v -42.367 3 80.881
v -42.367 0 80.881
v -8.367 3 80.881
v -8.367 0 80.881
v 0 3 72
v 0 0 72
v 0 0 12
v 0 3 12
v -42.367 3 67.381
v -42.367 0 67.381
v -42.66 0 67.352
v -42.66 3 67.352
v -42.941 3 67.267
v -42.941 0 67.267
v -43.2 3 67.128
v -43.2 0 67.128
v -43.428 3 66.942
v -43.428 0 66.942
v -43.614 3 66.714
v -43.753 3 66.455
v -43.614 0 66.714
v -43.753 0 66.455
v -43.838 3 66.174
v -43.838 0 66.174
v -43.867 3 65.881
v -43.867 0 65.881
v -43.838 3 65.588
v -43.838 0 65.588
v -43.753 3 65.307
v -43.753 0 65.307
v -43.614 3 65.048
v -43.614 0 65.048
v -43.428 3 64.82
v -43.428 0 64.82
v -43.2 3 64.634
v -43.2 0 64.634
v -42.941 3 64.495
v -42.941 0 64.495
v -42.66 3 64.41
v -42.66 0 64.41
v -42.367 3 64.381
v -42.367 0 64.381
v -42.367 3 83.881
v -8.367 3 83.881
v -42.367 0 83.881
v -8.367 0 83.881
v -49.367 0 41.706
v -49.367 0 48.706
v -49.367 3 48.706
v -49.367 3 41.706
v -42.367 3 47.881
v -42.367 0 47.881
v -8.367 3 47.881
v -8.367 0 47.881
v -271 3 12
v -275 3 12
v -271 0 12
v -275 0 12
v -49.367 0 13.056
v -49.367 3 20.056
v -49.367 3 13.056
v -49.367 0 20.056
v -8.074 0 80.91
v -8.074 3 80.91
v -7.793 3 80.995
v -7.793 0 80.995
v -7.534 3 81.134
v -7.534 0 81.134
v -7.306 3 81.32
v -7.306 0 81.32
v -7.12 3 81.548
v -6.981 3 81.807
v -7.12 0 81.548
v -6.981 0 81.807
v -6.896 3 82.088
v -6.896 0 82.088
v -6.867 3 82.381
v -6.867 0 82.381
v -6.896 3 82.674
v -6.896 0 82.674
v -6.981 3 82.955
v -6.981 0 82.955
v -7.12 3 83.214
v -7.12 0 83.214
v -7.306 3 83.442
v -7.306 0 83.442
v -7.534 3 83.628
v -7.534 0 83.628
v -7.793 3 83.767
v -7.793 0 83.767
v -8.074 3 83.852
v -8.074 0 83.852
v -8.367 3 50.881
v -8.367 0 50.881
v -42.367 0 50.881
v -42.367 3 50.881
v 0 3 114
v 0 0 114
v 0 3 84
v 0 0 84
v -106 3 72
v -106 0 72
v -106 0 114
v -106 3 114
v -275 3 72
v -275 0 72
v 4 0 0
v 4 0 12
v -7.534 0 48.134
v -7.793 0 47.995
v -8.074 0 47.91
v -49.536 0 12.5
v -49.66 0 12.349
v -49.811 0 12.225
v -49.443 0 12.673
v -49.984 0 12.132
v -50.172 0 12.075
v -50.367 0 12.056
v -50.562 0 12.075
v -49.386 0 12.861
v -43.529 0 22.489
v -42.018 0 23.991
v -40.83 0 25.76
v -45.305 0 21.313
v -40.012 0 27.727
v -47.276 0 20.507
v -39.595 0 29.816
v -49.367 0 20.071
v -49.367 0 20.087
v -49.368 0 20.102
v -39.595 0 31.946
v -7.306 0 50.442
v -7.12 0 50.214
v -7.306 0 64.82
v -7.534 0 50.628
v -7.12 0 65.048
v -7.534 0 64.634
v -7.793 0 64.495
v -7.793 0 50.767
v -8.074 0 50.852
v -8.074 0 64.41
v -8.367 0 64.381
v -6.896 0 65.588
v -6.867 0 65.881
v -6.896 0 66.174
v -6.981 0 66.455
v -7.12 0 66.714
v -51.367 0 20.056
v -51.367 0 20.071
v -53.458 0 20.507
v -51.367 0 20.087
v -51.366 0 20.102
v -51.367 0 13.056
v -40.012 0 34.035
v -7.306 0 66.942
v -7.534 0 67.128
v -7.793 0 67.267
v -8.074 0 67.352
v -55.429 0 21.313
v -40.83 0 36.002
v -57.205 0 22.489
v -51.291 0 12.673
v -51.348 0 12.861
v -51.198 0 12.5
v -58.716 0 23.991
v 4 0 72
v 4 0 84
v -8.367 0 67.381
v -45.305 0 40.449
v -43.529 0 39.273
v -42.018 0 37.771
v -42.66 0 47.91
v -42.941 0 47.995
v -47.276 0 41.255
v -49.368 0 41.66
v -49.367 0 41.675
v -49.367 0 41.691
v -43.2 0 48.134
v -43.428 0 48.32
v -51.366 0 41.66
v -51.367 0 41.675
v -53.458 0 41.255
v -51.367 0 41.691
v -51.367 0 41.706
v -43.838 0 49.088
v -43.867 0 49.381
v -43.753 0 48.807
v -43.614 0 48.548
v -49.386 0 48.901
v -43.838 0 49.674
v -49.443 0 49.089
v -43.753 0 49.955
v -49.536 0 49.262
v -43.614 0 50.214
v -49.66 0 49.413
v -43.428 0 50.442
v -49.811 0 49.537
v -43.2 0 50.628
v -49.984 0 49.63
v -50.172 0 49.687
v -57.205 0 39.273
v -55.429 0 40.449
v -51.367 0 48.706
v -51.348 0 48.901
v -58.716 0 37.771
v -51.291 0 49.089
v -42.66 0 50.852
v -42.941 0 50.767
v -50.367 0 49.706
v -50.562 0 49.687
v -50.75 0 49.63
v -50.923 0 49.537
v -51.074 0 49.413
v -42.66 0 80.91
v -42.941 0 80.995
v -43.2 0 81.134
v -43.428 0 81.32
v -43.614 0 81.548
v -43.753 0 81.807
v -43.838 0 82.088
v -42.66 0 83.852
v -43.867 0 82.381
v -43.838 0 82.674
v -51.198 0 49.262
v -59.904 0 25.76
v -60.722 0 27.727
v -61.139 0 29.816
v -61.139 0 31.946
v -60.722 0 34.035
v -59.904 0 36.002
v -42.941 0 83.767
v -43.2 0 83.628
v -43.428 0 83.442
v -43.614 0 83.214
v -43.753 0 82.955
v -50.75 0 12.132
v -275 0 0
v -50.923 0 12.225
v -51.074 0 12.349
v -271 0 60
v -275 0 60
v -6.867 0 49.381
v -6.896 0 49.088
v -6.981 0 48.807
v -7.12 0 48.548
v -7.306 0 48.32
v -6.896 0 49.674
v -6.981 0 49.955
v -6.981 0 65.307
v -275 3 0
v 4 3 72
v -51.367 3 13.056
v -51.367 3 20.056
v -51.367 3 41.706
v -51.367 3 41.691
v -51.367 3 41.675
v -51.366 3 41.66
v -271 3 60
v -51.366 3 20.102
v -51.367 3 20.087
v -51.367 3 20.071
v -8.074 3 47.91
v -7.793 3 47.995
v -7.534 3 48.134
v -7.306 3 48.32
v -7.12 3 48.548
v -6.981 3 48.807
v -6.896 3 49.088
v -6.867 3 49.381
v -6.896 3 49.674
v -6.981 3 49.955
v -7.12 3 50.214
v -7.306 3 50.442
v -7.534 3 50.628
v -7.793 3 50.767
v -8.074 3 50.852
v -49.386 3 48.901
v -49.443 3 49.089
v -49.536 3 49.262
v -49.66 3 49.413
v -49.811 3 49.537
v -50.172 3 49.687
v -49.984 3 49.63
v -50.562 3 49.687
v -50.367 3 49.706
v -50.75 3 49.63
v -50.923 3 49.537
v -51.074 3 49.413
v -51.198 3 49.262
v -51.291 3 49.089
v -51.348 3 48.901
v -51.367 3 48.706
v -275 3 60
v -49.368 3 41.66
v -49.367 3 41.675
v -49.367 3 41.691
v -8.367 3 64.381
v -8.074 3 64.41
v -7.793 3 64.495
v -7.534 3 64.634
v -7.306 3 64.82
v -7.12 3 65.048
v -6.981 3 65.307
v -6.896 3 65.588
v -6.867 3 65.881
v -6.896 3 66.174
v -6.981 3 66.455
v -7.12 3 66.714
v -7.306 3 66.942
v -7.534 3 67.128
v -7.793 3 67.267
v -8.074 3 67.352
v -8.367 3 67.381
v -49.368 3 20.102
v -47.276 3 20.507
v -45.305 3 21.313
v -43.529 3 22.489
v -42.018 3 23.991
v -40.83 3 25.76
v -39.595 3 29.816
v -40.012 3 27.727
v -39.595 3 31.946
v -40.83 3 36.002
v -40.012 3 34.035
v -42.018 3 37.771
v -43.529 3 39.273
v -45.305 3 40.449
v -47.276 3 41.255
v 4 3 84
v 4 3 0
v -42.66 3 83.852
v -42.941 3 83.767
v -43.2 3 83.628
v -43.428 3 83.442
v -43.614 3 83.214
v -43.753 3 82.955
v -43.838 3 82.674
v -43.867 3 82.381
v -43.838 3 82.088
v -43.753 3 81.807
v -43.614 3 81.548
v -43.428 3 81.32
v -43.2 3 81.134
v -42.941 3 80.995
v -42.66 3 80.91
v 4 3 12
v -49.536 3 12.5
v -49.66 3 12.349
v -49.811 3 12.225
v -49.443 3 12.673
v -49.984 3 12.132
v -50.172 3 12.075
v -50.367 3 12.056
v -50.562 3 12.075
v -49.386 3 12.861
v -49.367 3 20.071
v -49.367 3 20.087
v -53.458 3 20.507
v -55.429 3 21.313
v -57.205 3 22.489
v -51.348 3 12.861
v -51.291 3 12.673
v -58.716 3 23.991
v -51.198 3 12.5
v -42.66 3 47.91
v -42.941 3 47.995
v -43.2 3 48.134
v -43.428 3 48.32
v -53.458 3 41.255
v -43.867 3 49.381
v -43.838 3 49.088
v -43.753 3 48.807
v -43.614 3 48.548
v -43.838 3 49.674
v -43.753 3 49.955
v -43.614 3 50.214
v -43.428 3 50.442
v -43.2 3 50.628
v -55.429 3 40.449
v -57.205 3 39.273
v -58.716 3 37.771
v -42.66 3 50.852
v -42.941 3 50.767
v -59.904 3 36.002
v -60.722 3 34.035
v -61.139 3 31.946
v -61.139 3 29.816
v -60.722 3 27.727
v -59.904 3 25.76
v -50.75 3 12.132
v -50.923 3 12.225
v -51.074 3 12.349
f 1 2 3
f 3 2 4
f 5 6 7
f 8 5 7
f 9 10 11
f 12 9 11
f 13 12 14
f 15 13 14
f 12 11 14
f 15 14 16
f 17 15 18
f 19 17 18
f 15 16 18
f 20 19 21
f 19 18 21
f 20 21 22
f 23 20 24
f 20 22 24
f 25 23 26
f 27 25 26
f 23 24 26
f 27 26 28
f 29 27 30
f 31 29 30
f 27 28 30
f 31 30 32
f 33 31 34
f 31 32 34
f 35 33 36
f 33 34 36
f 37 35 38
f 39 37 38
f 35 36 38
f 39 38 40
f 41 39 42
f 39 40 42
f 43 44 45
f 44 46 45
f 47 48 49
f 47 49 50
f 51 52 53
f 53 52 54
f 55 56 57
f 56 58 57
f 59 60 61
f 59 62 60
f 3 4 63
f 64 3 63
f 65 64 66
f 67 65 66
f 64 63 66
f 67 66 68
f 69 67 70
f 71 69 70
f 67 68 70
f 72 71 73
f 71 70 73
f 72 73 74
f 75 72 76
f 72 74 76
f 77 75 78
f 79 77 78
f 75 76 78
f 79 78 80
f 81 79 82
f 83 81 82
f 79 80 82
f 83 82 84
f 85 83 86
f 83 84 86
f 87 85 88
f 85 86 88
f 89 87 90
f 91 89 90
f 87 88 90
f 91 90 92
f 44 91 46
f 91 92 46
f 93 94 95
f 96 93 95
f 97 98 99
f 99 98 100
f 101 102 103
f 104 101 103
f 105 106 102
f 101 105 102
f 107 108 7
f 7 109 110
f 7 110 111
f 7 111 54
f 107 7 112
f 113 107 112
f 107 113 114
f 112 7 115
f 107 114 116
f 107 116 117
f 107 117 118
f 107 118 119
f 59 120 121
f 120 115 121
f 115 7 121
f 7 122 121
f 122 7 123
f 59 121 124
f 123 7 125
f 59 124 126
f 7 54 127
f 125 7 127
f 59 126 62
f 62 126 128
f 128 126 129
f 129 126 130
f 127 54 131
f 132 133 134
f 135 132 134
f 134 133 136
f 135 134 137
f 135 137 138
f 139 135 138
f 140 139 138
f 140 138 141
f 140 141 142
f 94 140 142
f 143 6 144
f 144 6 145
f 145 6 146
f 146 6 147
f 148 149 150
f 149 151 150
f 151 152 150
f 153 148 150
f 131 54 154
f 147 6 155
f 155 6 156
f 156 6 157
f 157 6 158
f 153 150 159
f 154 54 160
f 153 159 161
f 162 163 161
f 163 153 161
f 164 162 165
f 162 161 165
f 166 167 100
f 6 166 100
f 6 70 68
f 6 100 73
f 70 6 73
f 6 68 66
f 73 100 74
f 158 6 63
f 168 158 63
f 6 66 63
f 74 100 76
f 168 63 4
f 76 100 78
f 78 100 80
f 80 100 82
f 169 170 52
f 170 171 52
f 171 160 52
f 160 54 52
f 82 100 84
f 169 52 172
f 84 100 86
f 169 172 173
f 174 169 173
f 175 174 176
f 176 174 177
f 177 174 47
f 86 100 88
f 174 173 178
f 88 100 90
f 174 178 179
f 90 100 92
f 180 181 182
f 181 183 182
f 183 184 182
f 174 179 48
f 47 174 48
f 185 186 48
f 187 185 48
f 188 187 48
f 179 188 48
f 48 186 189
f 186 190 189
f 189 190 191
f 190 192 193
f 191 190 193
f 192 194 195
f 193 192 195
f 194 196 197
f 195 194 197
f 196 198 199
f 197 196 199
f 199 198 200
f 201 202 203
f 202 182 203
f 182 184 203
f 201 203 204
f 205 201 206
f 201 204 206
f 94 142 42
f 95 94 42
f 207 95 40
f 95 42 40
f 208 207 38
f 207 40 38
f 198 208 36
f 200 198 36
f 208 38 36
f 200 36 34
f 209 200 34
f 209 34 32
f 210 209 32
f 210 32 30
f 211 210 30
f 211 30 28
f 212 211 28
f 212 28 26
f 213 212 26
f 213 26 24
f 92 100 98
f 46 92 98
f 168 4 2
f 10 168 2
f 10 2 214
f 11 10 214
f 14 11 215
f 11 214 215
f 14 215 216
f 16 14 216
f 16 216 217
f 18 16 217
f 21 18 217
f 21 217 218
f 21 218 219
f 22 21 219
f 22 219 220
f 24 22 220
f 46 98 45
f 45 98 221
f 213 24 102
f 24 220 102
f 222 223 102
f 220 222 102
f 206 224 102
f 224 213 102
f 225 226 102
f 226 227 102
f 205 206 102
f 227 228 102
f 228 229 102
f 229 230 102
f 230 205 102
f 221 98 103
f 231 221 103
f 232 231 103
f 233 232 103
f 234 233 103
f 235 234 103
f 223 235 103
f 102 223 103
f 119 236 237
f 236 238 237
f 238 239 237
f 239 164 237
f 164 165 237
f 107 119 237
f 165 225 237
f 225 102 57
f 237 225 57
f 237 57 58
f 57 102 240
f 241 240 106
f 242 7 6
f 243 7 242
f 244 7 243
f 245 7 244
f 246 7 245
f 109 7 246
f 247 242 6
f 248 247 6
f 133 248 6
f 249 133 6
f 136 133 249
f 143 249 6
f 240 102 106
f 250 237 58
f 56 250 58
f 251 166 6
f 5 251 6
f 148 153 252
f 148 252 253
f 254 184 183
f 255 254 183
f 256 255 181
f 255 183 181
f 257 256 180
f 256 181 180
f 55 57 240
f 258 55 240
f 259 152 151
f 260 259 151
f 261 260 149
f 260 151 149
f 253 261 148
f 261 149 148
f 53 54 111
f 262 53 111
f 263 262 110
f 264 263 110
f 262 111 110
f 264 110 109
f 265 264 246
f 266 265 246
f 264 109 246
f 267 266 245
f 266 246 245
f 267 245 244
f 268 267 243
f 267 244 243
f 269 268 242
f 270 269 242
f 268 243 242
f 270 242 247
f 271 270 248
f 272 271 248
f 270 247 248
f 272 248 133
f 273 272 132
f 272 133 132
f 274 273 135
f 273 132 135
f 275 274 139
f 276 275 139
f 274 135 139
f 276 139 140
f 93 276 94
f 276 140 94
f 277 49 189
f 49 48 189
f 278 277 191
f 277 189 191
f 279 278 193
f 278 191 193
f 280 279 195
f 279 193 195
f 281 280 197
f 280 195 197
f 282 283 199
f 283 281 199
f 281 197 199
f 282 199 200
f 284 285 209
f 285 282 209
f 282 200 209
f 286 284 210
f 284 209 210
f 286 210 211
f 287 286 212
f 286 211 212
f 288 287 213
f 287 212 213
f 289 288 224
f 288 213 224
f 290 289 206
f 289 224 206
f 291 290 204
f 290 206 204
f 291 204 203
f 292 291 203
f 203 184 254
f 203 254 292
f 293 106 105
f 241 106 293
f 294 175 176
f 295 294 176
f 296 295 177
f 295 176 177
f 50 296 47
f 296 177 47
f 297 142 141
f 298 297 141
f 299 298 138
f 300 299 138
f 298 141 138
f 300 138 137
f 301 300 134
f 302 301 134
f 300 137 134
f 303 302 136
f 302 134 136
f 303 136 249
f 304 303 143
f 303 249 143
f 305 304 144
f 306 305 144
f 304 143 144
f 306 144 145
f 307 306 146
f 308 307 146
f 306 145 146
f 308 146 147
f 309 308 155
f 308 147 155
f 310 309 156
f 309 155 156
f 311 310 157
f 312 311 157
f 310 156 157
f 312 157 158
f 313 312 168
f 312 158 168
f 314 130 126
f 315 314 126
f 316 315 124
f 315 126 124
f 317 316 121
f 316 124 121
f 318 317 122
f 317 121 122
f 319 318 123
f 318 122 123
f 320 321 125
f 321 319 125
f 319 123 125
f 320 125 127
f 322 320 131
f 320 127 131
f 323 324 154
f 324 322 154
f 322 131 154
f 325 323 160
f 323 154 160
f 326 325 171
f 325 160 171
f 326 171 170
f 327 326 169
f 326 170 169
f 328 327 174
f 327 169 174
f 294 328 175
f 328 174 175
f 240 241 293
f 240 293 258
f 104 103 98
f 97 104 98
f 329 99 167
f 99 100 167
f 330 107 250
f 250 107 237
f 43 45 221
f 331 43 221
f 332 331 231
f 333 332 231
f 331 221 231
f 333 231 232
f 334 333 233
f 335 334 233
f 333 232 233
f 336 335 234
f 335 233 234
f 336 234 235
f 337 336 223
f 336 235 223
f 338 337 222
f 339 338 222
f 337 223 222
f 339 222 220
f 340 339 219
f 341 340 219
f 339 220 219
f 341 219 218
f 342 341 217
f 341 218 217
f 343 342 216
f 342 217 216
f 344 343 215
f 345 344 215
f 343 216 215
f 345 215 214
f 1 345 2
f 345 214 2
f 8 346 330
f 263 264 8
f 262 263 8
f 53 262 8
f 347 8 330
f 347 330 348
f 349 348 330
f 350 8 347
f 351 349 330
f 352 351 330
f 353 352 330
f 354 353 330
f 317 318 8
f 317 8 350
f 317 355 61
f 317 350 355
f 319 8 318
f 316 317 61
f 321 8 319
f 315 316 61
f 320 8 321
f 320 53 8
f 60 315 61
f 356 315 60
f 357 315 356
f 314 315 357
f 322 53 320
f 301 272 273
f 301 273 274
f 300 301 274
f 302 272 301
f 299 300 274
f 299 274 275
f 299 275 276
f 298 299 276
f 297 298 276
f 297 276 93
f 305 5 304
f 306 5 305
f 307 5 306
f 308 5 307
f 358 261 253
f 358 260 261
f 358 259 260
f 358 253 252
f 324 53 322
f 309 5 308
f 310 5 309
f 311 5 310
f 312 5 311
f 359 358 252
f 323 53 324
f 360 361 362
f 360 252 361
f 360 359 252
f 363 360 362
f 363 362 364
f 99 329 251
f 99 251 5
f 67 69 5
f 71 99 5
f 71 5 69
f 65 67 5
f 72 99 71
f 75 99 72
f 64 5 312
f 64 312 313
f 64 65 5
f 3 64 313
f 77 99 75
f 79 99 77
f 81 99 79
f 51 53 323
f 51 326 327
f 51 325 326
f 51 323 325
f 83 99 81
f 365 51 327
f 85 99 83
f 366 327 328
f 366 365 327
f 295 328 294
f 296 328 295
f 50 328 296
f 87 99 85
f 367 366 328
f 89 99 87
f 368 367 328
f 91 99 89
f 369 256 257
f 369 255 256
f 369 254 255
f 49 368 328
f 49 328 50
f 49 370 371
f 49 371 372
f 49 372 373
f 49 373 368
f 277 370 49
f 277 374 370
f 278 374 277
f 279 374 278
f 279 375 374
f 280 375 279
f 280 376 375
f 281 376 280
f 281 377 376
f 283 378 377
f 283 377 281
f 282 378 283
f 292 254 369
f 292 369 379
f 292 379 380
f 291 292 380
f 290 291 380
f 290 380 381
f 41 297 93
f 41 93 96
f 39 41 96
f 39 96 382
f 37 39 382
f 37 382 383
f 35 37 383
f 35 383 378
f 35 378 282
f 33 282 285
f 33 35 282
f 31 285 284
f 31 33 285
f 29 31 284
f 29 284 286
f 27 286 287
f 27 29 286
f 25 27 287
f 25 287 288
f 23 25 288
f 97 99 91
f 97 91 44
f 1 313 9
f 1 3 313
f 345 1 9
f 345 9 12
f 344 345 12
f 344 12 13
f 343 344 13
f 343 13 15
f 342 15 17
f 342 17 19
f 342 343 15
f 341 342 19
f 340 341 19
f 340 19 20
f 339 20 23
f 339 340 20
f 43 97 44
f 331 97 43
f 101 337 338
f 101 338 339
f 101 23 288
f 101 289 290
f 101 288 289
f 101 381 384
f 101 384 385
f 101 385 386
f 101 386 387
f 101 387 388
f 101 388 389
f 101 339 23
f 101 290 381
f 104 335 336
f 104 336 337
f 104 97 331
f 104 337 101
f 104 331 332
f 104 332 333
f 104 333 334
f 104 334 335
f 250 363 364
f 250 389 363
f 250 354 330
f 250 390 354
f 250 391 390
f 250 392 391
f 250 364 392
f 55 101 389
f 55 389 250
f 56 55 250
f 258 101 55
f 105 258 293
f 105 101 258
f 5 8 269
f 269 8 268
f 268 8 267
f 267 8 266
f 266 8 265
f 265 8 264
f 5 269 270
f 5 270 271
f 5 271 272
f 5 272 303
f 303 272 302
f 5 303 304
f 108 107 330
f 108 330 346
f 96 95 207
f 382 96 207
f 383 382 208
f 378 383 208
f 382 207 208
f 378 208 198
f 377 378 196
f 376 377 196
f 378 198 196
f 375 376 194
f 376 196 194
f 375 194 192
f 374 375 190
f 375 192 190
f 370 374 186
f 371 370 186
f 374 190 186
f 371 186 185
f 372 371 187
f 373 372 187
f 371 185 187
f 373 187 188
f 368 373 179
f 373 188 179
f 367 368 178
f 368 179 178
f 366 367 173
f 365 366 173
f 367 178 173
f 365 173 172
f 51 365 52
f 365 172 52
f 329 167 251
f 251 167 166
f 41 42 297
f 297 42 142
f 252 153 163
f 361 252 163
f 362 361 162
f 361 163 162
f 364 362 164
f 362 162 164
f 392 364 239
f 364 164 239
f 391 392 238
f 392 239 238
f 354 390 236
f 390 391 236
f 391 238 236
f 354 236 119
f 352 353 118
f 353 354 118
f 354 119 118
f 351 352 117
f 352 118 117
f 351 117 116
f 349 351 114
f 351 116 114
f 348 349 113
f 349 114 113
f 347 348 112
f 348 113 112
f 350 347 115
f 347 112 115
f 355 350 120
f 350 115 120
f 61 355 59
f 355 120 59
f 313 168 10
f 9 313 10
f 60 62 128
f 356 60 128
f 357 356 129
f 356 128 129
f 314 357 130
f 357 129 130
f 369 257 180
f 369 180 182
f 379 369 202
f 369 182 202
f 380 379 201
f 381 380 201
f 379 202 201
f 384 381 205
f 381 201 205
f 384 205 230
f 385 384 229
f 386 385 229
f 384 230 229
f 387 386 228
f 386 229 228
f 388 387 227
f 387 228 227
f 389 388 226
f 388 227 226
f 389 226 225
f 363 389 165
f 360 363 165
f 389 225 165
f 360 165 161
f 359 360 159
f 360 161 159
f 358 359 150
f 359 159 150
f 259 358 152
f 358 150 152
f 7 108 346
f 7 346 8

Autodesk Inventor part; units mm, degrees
ref_plane "YZ Plane" through (0, 0, 0) normal (1, 0, 0) x (0, 1, 0)
ref_plane "XZ Plane" through (0, 0, 0) normal (0, 1, 0) x (-1, 0, 0)
ref_plane "XY Plane" through (0, 0, 0) normal (0, 0, 1) x (1, 0, 0)
sketch "Sketch1" plane through (0, 0, 0) normal (0, 1, 0) x (-1, 0, 0)
  line L0 (0, 0) -> (271, 0)
  line L1 (271, 0) -> (271, 84)
  line L2 (271, 84) -> (0, 84)
  line L3 (0, 84) -> (0, 0)
  line L4 (135.5, 84) -> (135.5, 0) construction
  line L5 (0, 84) -> (-4, 84)
  line L6 (-4, 84) -> (-4, 72)
  line L7 (-4, 72) -> (0, 72)
  line L8 (0, 72) -> (0, 84)
  line L9 (0, 0) -> (-4, 0)
  line L10 (-4, 0) -> (-4, 12)
  line L11 (-4, 12) -> (0, 12)
  line L12 (0, 12) -> (0, 0)
  line L13 (271, 84) -> (271, 0)
  line L14 (275, 72) -> (275, 60)
  line L15 (275, 60) -> (271, 60)
  line L16 (271, 60) -> (271, 84)
  line L17 (271, 0) -> (275, 0)
  line L18 (275, 0) -> (275, 12)
  line L19 (275, 12) -> (271, 12)
  line L20 (271, 12) -> (271, 0)
  arc A0 (51.367, 20.056) -> (49.367, 20.056) centre (50.367, 20.056) ccw
  arc A1 (49.367, 41.706) -> (51.367, 41.706) centre (50.367, 41.706) ccw
  line L21 (49.367, 48.706) -> (49.367, 41.706)
  line L22 (50.367, 41.706) -> (50.367, 48.706) construction
  line L23 (51.367, 41.706) -> (51.367, 48.706)
  arc A2 (51.367, 48.706) -> (49.367, 48.706) centre (50.367, 48.706) ccw
  circle A3 centre (50.367, 30.881) radius 10.825
  arc A4 (49.367, 13.056) -> (51.367, 13.056) centre (50.367, 13.056) ccw
  line L24 (49.367, 20.056) -> (49.367, 13.056)
  line L25 (50.367, 20.056) -> (50.367, 13.056) construction
  line L26 (51.367, 13.056) -> (51.367, 20.056)
  line L27 (275, 72) -> (271, 72)
  point P0 (50.367, 45.206)
  point P1 (50.367, 16.556)
  dimension "d0" = 271
  dimension "d2" = 4
  dimension "d3" = 12
  dimension "d4" = 4
  dimension "d5" = 12
  dimension "d20" = 21.65
  dimension "d21" = 7
  dimension "d22" = 2
  dimension "d23" = 7
  dimension "d24" = 2
  dimension "d56" = 50.367
  dimension "d57" = 30.881
  dimension "d58" = 48
  dimension "d59" = 12
  dimension "d60" = 12
extrude "Extrusion1" add sketch "Sketch1" along normal blind 3
sketch "Sketch3" plane through (0, 0, 0) normal (0, -1, 0) x (1, 0, 0)
  line L0 (4, 0) -> (-275, 0) projected
  line L1 (-270, 114) -> (0, 114)
  line L2 (0, 114) -> (0, 84)
  line L3 (0, 84) -> (-270, 84)
  line L4 (-270, 84) -> (-270, 114)
  line L5 (-275, 84) -> (4, 84) projected
  point P0 (0, 0)
  point P1 (-275, 72)
  point P2 (4, 84)
  dimension "d28" = 30
extrude "Extrusion2" add sketch "Sketch3" against normal blind 3
sketch "Sketch2" plane through (0, 0, 0) normal (0, -1, 0) x (1, 0, 0)
  circle A0 centre (-25.367, 65.881) radius 1.5 construction
  arc A1 (-49.3681, 20.1022) -> (-49.3681, 41.6598) centre (-50.367, 30.881) ccw construction
  line L0 (-8.367, 65.881) -> (-42.367, 65.881) construction
  line L1 (-8.367, 67.381) -> (-42.367, 67.381)
  line L2 (-42.367, 64.381) -> (-8.367, 64.381)
  arc A2 (-8.367, 64.381) -> (-8.367, 67.381) centre (-8.367, 65.881) ccw
  arc A3 (-42.367, 67.381) -> (-42.367, 64.381) centre (-42.367, 65.881) ccw
  line L3 (-8.367, 82.381) -> (-42.367, 82.381) construction
  line L4 (-8.367, 83.881) -> (-42.367, 83.881)
  line L5 (-42.367, 80.881) -> (-8.367, 80.881)
  arc A4 (-8.367, 80.881) -> (-8.367, 83.881) centre (-8.367, 82.381) ccw
  arc A5 (-42.367, 83.881) -> (-42.367, 80.881) centre (-42.367, 82.381) ccw
  line L6 (-8.367, 49.381) -> (-42.367, 49.381) construction
  line L7 (-8.367, 50.881) -> (-42.367, 50.881)
  line L8 (-42.367, 47.881) -> (-8.367, 47.881)
  arc A6 (-8.367, 47.881) -> (-8.367, 50.881) centre (-8.367, 49.381) ccw
  arc A7 (-42.367, 50.881) -> (-42.367, 47.881) centre (-42.367, 49.381) ccw
  line L9 (-42.367, 65.881) -> (-42.367, 49.381) construction
  line L10 (-42.367, 82.381) -> (-42.367, 65.881) construction
  point P0 (0, 0)
  point P1 (-25.367, 82.381)
  point P2 (-25.367, 49.381)
  dimension "d41" = 3
  dimension "d43" = 25
  dimension "d44" = 35
  dimension "d45" = 17
  dimension "d46" = 3
  dimension "d47" = 17
  dimension "d48" = 3
  dimension "d52" = 17
  dimension "d53" = 3
  dimension "d54" = 16.5
  dimension "d55" = 16.5
extrude "Extrusion3" cut sketch "Sketch2" against normal blind 3
sketch "Sketch4" plane through (0, 0, 0) normal (0, -1, 0) x (1, 0, 0)
  line L0 (-275, 72) -> (-271, 72) projected
  line L1 (-270, 114) -> (0, 114) projected
  line L2 (-271, 72) -> (-106, 72)
  line L3 (-106, 72) -> (-106, 114)
  line L4 (-106, 114) -> (-271, 114)
  line L5 (-271, 114) -> (-271, 72)
  point P0 (0, 0)
  dimension "d61" = 165
extrude "Extrusion4" cut sketch "Sketch4" along normal through all both and the other way through all
equation "\"d4\" = d2"
equation "\"d41\" = d40"
equation "\"d45\" = d52"
equation "\"d47\" = d52"
equation "\"d40\" = 3"
properties part number "flipper-support2"
